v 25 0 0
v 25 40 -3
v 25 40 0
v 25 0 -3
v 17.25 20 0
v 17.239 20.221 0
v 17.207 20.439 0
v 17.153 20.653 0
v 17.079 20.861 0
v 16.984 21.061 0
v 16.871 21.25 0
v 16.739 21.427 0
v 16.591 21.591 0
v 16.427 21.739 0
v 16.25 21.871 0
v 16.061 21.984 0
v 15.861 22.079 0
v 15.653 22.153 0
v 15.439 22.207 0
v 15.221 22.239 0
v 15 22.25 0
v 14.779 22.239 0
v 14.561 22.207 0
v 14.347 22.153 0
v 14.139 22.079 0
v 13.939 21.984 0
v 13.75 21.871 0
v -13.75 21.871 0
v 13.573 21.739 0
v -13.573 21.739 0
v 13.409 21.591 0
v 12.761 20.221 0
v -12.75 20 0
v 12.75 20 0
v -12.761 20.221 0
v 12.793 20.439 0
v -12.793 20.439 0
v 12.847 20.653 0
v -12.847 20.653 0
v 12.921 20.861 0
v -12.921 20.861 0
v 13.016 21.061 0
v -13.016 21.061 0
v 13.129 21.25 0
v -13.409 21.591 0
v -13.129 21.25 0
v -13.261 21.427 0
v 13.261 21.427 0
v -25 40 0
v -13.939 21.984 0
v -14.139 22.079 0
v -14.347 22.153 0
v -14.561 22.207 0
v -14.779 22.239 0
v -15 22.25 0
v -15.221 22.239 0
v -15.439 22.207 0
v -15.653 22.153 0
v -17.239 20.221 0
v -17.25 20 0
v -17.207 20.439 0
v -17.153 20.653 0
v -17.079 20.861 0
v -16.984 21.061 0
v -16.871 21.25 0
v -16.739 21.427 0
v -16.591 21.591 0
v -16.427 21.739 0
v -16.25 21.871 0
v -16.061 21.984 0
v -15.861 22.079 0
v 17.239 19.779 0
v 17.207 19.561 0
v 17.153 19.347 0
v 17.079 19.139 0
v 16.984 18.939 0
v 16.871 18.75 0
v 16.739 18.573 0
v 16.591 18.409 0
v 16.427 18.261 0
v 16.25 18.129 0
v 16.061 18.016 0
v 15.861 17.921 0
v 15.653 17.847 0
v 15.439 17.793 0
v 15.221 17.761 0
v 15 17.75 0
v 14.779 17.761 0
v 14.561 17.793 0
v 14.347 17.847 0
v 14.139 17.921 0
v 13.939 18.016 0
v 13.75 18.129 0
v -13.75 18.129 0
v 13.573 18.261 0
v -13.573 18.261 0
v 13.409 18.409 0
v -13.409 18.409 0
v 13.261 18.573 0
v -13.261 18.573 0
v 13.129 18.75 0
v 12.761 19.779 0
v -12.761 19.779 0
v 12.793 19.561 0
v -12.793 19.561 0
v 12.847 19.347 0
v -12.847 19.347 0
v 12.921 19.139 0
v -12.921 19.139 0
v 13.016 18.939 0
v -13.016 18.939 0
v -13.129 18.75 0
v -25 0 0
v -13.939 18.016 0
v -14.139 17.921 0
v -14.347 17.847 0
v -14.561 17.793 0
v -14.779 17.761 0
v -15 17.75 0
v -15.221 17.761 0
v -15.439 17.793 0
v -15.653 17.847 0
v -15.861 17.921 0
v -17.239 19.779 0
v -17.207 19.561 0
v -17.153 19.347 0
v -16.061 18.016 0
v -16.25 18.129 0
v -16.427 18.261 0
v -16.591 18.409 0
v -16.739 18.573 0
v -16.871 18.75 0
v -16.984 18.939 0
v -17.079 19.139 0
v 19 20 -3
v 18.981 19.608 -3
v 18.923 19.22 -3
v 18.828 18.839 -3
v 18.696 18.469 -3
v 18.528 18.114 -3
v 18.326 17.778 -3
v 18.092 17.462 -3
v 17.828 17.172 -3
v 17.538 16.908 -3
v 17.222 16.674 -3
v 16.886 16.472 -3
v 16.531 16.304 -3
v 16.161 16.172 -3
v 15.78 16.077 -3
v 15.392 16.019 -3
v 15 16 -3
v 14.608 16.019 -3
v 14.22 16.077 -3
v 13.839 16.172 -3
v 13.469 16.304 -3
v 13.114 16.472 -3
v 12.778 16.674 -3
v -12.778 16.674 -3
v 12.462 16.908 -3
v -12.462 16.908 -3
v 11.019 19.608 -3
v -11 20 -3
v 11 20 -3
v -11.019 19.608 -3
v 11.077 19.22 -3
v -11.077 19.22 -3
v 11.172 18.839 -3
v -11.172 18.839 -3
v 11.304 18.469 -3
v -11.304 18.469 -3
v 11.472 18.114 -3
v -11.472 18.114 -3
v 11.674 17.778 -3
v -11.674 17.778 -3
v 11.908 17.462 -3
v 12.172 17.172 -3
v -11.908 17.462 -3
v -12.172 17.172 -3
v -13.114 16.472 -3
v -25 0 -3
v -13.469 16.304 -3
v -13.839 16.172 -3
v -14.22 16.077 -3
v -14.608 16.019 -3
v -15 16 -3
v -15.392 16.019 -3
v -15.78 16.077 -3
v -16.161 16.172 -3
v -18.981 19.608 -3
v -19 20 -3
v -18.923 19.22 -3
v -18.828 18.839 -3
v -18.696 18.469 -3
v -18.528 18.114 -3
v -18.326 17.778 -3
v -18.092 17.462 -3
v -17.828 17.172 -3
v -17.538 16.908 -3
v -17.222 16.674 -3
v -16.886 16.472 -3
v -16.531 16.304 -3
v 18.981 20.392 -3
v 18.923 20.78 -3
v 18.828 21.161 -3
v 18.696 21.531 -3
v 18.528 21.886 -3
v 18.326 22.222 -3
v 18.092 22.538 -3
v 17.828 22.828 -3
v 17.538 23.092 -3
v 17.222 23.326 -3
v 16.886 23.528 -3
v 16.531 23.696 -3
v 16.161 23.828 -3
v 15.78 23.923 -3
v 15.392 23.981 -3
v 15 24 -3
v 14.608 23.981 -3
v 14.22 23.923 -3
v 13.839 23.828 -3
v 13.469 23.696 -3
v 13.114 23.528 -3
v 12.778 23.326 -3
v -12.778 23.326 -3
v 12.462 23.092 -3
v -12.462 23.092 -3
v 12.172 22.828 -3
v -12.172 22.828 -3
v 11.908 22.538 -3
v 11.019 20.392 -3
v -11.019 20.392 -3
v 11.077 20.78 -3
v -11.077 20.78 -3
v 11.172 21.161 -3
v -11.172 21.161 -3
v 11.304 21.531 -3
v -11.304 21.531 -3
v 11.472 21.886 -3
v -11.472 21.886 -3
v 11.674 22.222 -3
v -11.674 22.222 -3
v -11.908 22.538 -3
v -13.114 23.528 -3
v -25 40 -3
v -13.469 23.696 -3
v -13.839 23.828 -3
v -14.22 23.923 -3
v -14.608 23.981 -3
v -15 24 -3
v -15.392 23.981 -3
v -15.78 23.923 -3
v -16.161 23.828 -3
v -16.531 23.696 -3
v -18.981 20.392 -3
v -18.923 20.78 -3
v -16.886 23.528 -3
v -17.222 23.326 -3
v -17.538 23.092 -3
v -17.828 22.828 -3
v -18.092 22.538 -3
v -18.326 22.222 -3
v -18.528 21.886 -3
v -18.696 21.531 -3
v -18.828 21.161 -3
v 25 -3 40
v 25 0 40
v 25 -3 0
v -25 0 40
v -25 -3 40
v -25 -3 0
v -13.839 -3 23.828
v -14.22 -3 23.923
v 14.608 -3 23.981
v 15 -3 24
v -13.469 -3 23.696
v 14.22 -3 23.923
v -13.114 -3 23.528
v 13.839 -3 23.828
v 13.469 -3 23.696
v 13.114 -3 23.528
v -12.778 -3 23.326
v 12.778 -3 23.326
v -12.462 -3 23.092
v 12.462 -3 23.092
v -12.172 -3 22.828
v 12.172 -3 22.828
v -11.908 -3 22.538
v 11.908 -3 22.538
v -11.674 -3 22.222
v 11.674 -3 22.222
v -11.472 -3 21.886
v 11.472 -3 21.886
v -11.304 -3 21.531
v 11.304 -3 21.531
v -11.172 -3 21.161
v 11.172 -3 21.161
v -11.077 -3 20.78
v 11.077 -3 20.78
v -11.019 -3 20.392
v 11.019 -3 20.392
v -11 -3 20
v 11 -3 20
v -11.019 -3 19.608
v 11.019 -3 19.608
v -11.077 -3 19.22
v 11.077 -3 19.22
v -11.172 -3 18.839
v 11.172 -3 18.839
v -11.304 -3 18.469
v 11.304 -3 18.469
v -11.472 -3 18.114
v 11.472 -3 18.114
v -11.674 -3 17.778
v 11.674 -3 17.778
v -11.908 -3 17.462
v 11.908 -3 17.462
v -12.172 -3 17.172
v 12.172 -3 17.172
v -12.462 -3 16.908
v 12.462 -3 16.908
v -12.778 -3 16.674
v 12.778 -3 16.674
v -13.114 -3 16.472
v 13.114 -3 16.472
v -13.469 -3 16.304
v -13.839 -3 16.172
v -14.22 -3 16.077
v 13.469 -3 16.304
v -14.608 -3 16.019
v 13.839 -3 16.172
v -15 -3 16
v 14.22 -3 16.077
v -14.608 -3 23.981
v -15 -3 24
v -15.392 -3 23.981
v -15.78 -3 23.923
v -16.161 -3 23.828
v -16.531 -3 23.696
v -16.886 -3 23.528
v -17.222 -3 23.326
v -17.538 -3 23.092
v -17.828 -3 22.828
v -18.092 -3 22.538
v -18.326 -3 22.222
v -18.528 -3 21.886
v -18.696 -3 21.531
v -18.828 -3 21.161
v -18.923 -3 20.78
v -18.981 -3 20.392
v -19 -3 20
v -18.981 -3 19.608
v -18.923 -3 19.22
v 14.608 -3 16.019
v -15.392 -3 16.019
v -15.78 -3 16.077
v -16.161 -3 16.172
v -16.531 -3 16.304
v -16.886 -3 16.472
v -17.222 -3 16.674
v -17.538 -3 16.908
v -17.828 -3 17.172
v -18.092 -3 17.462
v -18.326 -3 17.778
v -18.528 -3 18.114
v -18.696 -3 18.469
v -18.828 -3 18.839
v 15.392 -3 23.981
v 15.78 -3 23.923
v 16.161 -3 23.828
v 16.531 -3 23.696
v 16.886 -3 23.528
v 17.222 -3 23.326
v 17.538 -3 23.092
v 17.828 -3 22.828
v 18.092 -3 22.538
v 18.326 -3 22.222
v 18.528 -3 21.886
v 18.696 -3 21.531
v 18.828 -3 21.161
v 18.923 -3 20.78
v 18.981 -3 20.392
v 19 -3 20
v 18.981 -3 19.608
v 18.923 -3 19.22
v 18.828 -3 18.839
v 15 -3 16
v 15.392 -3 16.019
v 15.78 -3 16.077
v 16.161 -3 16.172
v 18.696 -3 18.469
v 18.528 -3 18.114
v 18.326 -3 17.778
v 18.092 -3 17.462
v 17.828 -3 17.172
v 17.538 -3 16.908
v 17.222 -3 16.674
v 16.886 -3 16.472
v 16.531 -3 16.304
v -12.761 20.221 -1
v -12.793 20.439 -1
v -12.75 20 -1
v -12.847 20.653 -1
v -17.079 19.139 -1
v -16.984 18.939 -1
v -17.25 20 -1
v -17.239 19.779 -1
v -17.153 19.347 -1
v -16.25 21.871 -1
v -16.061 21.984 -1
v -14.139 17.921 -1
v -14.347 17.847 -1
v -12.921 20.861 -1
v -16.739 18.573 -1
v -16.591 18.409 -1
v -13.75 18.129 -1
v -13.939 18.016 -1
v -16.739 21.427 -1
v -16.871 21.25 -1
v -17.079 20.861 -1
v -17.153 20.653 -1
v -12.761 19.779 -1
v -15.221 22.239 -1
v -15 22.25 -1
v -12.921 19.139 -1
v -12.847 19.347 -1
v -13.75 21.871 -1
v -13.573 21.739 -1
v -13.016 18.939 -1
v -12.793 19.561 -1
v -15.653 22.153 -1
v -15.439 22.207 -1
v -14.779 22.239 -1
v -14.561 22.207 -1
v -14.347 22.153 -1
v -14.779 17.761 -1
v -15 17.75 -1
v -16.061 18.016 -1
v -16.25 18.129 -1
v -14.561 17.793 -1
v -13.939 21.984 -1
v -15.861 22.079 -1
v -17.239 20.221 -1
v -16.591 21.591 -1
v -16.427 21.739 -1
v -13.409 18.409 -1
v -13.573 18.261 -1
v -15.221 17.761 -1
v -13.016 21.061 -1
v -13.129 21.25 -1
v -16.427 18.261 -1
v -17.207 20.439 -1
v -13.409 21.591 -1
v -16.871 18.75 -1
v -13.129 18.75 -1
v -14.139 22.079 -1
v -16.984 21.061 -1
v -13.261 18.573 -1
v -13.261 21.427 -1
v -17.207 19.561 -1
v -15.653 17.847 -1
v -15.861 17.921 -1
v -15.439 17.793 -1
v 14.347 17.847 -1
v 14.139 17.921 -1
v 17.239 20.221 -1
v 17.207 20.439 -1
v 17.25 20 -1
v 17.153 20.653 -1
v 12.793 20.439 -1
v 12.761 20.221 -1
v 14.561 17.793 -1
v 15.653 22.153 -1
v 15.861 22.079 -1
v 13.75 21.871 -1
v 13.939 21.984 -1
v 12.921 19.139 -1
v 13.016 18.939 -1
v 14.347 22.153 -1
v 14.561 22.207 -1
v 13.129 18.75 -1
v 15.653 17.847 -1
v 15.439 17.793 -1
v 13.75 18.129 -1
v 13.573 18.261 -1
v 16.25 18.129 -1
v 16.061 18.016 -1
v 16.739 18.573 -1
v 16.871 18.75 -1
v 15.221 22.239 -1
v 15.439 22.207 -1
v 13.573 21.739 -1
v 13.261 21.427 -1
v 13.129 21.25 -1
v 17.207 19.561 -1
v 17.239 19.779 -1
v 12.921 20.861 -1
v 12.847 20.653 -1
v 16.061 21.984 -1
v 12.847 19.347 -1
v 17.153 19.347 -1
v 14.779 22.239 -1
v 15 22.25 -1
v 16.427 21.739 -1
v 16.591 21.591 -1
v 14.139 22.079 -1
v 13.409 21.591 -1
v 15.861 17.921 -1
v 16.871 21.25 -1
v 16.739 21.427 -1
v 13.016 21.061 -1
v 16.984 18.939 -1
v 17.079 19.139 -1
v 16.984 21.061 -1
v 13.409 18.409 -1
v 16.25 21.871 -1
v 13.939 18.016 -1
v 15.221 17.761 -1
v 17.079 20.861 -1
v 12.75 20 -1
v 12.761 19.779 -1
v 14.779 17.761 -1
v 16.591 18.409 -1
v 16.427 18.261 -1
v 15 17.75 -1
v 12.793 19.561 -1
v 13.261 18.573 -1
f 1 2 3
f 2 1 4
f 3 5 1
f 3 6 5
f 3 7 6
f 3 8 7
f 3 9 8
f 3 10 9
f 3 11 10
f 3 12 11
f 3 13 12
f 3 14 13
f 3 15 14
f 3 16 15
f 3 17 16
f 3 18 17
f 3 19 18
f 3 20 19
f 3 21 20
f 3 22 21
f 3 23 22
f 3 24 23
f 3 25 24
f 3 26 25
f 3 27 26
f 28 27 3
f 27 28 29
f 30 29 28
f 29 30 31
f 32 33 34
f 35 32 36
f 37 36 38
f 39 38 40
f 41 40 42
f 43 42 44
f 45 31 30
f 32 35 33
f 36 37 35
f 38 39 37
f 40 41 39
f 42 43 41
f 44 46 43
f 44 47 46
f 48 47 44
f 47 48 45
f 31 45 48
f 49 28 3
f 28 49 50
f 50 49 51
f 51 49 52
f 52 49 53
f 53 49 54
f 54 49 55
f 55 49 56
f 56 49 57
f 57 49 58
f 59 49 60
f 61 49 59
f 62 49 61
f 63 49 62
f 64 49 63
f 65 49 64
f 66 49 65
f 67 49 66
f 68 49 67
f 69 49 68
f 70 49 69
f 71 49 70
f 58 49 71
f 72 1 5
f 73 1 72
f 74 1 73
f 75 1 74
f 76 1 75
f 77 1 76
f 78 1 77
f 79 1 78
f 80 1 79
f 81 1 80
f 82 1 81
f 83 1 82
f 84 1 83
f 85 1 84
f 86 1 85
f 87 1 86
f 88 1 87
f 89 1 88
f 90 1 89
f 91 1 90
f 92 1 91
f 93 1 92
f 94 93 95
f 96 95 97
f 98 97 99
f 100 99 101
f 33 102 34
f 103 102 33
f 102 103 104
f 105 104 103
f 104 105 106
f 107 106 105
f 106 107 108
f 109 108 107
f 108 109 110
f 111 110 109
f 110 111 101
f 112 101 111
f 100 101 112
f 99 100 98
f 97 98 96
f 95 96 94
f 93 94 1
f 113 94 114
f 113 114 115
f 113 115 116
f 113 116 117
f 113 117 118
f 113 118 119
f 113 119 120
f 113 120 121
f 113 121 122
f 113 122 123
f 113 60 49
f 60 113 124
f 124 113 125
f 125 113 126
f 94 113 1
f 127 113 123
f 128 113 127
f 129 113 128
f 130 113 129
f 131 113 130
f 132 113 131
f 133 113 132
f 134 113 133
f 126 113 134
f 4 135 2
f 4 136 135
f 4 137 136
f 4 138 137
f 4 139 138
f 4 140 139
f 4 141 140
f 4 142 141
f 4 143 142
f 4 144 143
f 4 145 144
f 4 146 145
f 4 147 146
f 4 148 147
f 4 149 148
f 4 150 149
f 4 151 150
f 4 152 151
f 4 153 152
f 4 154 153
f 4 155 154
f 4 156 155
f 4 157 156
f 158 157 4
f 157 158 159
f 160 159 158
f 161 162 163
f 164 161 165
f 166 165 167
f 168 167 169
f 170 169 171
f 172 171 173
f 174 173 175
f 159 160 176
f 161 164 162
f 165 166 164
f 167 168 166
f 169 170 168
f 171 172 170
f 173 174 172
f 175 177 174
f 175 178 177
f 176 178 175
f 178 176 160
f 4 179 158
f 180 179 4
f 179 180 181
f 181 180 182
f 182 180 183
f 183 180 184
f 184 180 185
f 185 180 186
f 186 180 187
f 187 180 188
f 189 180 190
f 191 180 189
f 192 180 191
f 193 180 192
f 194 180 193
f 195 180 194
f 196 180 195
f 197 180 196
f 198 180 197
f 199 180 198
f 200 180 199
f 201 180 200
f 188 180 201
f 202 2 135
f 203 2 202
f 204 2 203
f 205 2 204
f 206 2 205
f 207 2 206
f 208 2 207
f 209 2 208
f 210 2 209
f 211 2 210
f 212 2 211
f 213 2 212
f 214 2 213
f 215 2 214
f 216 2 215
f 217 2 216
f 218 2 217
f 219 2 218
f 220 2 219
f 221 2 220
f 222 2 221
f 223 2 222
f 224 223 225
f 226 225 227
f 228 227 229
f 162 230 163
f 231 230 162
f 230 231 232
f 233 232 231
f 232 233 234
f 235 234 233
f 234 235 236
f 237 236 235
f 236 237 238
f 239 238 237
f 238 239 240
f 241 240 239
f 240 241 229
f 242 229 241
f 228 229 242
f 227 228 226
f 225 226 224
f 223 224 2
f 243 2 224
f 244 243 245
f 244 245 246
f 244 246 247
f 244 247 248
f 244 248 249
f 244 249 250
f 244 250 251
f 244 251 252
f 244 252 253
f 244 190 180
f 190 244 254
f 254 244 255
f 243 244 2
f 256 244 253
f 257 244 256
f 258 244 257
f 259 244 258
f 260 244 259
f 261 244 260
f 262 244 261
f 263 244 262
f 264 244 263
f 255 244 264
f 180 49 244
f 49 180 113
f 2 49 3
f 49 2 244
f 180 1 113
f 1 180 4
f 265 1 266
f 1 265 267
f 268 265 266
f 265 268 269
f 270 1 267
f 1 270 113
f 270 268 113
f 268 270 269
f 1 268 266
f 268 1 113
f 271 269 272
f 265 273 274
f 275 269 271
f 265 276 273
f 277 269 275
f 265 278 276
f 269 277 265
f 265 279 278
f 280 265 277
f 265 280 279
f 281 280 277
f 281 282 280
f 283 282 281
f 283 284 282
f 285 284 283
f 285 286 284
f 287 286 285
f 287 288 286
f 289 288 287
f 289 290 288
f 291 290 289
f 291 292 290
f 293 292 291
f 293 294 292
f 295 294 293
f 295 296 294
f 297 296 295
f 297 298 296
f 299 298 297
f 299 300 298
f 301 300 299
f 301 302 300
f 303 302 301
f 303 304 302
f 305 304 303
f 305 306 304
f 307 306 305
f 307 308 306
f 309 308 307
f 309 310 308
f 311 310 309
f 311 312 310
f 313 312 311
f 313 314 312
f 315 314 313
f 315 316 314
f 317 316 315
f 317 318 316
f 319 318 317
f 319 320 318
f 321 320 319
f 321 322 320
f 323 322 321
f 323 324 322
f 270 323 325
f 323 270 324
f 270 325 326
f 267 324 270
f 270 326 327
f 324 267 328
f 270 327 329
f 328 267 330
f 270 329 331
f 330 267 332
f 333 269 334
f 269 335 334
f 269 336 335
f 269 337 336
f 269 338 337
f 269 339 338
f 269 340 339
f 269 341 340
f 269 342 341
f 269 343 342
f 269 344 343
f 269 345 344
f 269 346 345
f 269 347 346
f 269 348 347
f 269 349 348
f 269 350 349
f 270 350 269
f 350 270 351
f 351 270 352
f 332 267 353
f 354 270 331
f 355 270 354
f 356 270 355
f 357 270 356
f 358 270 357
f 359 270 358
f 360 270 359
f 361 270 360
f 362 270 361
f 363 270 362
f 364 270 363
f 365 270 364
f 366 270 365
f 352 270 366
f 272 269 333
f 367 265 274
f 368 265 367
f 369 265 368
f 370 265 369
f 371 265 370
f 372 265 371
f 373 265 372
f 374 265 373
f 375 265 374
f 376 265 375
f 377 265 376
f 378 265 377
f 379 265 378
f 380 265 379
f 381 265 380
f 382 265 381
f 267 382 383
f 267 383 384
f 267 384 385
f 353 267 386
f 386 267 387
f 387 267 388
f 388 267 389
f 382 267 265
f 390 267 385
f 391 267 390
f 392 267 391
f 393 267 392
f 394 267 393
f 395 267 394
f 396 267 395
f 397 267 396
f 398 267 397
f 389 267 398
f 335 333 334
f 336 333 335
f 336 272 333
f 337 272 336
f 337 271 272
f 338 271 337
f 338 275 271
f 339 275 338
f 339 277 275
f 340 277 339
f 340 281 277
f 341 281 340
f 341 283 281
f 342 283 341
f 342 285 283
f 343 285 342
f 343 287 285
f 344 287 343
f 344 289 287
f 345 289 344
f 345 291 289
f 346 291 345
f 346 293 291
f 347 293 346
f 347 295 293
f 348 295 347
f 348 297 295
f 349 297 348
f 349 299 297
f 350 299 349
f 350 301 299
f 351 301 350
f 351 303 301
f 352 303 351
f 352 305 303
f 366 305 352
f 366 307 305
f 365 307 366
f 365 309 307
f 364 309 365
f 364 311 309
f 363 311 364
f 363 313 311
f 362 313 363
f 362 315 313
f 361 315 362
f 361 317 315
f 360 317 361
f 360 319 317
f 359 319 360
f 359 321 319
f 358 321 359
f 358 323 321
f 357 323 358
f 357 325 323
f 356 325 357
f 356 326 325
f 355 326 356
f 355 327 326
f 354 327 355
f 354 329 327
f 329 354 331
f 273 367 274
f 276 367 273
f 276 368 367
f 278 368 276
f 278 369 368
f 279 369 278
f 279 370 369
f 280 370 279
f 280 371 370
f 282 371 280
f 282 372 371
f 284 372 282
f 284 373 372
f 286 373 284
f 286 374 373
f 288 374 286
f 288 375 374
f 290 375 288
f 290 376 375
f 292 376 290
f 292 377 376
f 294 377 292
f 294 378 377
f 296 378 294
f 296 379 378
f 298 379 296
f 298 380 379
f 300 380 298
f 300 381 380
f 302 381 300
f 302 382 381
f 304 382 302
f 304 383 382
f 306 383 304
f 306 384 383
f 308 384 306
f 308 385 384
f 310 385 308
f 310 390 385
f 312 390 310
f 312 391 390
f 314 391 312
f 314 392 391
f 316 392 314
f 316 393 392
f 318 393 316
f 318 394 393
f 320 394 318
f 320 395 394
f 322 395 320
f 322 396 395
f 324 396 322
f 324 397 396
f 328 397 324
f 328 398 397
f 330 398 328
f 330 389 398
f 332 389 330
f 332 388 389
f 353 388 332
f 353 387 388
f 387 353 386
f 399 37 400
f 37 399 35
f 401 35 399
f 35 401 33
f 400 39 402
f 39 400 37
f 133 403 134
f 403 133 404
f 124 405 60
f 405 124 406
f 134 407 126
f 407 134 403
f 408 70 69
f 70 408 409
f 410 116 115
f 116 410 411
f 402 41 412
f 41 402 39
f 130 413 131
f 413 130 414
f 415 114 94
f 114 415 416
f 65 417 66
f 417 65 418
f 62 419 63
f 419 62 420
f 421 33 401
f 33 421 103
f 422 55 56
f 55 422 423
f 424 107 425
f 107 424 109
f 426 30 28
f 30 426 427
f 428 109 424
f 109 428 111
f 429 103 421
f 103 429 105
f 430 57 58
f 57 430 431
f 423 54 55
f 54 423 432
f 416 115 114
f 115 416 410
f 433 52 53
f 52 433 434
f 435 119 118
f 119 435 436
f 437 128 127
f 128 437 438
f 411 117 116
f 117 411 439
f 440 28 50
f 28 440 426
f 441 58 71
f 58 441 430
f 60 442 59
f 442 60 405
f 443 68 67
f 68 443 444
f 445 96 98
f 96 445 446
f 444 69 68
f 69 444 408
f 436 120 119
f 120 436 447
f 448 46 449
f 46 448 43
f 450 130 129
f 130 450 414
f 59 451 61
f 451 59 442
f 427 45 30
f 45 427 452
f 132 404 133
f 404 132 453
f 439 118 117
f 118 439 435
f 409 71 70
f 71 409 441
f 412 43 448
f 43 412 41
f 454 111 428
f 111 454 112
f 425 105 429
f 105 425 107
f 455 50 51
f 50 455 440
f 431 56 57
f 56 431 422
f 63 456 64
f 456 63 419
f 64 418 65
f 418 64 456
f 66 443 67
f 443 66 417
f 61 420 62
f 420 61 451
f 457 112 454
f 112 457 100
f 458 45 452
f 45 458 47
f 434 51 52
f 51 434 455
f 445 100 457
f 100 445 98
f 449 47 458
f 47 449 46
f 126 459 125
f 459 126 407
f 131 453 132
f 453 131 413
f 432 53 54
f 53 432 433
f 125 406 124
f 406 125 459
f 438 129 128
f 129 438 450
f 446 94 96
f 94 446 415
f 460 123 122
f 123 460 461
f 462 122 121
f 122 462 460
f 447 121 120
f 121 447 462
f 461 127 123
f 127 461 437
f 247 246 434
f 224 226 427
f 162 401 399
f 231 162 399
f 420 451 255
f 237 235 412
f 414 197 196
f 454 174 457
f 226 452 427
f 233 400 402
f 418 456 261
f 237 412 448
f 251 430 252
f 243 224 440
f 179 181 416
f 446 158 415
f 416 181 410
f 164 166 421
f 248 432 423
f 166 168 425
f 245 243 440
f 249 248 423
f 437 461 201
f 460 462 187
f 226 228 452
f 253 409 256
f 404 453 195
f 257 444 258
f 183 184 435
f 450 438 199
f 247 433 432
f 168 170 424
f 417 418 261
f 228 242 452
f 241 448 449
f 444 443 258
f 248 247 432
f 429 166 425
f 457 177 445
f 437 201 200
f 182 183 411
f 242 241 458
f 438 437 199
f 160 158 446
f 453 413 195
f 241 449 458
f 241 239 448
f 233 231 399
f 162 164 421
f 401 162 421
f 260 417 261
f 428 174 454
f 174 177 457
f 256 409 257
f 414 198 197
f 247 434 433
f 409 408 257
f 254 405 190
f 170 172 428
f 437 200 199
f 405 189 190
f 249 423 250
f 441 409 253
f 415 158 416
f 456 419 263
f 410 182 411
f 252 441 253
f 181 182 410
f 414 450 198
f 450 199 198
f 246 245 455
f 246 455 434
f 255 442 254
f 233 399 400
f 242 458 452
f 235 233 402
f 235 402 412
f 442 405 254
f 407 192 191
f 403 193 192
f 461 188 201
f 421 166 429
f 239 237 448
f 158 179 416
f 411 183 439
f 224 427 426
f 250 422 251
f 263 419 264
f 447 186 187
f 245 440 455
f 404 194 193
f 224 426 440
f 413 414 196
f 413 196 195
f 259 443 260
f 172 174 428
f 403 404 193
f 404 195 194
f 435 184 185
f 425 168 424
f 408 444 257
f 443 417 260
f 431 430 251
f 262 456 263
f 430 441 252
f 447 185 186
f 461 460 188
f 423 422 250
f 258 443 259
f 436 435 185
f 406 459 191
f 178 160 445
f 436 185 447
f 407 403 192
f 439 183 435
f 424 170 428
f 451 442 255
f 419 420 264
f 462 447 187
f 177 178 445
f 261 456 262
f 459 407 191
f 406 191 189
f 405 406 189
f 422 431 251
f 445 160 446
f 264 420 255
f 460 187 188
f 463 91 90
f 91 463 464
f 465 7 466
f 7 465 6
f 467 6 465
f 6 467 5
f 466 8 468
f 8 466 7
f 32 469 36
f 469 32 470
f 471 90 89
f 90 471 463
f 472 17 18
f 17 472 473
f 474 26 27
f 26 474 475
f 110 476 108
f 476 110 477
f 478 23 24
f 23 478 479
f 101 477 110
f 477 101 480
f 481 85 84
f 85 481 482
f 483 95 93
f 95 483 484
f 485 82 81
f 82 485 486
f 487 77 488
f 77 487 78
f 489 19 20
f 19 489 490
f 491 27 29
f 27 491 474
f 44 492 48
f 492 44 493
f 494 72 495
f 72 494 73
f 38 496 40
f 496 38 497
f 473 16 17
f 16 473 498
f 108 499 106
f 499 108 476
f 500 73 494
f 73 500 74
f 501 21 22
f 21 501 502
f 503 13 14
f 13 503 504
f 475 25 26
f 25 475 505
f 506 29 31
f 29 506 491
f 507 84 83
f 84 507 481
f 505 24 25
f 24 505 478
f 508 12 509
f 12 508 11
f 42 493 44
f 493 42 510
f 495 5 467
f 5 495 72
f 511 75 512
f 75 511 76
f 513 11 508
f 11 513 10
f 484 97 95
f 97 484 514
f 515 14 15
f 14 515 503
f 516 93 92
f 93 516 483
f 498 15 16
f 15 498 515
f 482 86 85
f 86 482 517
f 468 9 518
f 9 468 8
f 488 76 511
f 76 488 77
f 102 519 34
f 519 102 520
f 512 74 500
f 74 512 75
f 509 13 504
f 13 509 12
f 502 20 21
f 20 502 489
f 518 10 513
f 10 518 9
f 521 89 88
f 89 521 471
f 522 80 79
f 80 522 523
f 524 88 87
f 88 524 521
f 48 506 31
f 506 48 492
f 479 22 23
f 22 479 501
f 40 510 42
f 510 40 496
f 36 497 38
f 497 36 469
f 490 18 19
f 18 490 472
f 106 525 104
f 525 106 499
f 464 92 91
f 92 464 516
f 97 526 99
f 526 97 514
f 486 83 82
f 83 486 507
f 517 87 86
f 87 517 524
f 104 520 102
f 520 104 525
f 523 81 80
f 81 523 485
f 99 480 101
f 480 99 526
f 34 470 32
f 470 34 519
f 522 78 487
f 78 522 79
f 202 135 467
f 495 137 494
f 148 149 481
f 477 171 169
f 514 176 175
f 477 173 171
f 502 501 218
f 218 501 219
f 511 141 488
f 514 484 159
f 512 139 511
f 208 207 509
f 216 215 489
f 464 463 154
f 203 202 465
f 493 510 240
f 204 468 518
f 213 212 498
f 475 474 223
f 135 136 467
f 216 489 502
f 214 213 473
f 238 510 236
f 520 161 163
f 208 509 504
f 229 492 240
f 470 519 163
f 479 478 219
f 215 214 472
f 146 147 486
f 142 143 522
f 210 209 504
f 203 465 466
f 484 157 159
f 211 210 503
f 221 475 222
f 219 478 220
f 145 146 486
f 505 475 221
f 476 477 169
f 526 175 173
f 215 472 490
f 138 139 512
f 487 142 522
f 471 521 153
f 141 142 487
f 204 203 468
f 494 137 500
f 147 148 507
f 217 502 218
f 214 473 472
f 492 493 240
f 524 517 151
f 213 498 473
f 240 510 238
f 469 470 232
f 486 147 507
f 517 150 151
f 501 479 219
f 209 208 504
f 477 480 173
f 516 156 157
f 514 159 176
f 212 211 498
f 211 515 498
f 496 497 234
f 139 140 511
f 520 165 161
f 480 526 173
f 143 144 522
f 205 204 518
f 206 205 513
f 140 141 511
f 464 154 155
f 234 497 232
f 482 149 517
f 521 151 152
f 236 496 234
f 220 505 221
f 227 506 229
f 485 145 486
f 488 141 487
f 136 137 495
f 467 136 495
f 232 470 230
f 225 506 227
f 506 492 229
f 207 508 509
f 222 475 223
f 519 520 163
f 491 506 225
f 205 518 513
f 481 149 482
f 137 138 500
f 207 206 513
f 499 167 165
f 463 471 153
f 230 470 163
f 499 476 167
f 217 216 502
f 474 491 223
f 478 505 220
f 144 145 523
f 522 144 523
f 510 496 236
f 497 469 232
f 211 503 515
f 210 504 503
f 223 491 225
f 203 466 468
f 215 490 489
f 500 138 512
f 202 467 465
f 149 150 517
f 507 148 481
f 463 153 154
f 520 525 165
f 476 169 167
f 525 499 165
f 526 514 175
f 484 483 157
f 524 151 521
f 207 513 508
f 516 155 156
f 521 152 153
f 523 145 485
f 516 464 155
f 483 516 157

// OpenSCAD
// L-bracket dimensions
width     = 50;
flangeLen = 40;
thickness = 3;

// Hole dimensions
hole_d     = 4.5;
csk_d      = 8;
csk_depth  = 2;

// Hole positions
hole_x = [-15, 15];
hole_y = 20;
hole_z = 20;

$fn = 64;

module horizontal_countersunk_hole(x, y) {
    // Through hole
    translate([x, y, -thickness - 0.01])
        cylinder(h = thickness + 0.02, d = hole_d);

    // Countersink from the outer bottom face
    translate([x, y, -thickness])
        cylinder(h = csk_depth, d1 = csk_d, d2 = hole_d);
}

module vertical_countersunk_hole(x, z) {
    // Through hole
    translate([x, -thickness - 0.01, z])
        rotate([90, 0, 0])
            cylinder(h = thickness + 0.02, d = hole_d);

    // Countersink from the outer rear face
    translate([x, -thickness, z])
        rotate([90, 0, 0])
            cylinder(h = csk_depth, d1 = csk_d, d2 = hole_d);
}

difference() {
    union() {
        // Horizontal flange: +Y direction
        translate([-width / 2, 0, -thickness])
            cube([width, flangeLen, thickness]);

        // Vertical flange: +Z direction
        translate([-width / 2, -thickness, 0])
            cube([width, thickness, flangeLen]);
    }

    // Horizontal flange holes
    for (x = hole_x)
        horizontal_countersunk_hole(x, hole_y);

    // Vertical flange holes
    for (x = hole_x)
        vertical_countersunk_hole(x, hole_z);
}
